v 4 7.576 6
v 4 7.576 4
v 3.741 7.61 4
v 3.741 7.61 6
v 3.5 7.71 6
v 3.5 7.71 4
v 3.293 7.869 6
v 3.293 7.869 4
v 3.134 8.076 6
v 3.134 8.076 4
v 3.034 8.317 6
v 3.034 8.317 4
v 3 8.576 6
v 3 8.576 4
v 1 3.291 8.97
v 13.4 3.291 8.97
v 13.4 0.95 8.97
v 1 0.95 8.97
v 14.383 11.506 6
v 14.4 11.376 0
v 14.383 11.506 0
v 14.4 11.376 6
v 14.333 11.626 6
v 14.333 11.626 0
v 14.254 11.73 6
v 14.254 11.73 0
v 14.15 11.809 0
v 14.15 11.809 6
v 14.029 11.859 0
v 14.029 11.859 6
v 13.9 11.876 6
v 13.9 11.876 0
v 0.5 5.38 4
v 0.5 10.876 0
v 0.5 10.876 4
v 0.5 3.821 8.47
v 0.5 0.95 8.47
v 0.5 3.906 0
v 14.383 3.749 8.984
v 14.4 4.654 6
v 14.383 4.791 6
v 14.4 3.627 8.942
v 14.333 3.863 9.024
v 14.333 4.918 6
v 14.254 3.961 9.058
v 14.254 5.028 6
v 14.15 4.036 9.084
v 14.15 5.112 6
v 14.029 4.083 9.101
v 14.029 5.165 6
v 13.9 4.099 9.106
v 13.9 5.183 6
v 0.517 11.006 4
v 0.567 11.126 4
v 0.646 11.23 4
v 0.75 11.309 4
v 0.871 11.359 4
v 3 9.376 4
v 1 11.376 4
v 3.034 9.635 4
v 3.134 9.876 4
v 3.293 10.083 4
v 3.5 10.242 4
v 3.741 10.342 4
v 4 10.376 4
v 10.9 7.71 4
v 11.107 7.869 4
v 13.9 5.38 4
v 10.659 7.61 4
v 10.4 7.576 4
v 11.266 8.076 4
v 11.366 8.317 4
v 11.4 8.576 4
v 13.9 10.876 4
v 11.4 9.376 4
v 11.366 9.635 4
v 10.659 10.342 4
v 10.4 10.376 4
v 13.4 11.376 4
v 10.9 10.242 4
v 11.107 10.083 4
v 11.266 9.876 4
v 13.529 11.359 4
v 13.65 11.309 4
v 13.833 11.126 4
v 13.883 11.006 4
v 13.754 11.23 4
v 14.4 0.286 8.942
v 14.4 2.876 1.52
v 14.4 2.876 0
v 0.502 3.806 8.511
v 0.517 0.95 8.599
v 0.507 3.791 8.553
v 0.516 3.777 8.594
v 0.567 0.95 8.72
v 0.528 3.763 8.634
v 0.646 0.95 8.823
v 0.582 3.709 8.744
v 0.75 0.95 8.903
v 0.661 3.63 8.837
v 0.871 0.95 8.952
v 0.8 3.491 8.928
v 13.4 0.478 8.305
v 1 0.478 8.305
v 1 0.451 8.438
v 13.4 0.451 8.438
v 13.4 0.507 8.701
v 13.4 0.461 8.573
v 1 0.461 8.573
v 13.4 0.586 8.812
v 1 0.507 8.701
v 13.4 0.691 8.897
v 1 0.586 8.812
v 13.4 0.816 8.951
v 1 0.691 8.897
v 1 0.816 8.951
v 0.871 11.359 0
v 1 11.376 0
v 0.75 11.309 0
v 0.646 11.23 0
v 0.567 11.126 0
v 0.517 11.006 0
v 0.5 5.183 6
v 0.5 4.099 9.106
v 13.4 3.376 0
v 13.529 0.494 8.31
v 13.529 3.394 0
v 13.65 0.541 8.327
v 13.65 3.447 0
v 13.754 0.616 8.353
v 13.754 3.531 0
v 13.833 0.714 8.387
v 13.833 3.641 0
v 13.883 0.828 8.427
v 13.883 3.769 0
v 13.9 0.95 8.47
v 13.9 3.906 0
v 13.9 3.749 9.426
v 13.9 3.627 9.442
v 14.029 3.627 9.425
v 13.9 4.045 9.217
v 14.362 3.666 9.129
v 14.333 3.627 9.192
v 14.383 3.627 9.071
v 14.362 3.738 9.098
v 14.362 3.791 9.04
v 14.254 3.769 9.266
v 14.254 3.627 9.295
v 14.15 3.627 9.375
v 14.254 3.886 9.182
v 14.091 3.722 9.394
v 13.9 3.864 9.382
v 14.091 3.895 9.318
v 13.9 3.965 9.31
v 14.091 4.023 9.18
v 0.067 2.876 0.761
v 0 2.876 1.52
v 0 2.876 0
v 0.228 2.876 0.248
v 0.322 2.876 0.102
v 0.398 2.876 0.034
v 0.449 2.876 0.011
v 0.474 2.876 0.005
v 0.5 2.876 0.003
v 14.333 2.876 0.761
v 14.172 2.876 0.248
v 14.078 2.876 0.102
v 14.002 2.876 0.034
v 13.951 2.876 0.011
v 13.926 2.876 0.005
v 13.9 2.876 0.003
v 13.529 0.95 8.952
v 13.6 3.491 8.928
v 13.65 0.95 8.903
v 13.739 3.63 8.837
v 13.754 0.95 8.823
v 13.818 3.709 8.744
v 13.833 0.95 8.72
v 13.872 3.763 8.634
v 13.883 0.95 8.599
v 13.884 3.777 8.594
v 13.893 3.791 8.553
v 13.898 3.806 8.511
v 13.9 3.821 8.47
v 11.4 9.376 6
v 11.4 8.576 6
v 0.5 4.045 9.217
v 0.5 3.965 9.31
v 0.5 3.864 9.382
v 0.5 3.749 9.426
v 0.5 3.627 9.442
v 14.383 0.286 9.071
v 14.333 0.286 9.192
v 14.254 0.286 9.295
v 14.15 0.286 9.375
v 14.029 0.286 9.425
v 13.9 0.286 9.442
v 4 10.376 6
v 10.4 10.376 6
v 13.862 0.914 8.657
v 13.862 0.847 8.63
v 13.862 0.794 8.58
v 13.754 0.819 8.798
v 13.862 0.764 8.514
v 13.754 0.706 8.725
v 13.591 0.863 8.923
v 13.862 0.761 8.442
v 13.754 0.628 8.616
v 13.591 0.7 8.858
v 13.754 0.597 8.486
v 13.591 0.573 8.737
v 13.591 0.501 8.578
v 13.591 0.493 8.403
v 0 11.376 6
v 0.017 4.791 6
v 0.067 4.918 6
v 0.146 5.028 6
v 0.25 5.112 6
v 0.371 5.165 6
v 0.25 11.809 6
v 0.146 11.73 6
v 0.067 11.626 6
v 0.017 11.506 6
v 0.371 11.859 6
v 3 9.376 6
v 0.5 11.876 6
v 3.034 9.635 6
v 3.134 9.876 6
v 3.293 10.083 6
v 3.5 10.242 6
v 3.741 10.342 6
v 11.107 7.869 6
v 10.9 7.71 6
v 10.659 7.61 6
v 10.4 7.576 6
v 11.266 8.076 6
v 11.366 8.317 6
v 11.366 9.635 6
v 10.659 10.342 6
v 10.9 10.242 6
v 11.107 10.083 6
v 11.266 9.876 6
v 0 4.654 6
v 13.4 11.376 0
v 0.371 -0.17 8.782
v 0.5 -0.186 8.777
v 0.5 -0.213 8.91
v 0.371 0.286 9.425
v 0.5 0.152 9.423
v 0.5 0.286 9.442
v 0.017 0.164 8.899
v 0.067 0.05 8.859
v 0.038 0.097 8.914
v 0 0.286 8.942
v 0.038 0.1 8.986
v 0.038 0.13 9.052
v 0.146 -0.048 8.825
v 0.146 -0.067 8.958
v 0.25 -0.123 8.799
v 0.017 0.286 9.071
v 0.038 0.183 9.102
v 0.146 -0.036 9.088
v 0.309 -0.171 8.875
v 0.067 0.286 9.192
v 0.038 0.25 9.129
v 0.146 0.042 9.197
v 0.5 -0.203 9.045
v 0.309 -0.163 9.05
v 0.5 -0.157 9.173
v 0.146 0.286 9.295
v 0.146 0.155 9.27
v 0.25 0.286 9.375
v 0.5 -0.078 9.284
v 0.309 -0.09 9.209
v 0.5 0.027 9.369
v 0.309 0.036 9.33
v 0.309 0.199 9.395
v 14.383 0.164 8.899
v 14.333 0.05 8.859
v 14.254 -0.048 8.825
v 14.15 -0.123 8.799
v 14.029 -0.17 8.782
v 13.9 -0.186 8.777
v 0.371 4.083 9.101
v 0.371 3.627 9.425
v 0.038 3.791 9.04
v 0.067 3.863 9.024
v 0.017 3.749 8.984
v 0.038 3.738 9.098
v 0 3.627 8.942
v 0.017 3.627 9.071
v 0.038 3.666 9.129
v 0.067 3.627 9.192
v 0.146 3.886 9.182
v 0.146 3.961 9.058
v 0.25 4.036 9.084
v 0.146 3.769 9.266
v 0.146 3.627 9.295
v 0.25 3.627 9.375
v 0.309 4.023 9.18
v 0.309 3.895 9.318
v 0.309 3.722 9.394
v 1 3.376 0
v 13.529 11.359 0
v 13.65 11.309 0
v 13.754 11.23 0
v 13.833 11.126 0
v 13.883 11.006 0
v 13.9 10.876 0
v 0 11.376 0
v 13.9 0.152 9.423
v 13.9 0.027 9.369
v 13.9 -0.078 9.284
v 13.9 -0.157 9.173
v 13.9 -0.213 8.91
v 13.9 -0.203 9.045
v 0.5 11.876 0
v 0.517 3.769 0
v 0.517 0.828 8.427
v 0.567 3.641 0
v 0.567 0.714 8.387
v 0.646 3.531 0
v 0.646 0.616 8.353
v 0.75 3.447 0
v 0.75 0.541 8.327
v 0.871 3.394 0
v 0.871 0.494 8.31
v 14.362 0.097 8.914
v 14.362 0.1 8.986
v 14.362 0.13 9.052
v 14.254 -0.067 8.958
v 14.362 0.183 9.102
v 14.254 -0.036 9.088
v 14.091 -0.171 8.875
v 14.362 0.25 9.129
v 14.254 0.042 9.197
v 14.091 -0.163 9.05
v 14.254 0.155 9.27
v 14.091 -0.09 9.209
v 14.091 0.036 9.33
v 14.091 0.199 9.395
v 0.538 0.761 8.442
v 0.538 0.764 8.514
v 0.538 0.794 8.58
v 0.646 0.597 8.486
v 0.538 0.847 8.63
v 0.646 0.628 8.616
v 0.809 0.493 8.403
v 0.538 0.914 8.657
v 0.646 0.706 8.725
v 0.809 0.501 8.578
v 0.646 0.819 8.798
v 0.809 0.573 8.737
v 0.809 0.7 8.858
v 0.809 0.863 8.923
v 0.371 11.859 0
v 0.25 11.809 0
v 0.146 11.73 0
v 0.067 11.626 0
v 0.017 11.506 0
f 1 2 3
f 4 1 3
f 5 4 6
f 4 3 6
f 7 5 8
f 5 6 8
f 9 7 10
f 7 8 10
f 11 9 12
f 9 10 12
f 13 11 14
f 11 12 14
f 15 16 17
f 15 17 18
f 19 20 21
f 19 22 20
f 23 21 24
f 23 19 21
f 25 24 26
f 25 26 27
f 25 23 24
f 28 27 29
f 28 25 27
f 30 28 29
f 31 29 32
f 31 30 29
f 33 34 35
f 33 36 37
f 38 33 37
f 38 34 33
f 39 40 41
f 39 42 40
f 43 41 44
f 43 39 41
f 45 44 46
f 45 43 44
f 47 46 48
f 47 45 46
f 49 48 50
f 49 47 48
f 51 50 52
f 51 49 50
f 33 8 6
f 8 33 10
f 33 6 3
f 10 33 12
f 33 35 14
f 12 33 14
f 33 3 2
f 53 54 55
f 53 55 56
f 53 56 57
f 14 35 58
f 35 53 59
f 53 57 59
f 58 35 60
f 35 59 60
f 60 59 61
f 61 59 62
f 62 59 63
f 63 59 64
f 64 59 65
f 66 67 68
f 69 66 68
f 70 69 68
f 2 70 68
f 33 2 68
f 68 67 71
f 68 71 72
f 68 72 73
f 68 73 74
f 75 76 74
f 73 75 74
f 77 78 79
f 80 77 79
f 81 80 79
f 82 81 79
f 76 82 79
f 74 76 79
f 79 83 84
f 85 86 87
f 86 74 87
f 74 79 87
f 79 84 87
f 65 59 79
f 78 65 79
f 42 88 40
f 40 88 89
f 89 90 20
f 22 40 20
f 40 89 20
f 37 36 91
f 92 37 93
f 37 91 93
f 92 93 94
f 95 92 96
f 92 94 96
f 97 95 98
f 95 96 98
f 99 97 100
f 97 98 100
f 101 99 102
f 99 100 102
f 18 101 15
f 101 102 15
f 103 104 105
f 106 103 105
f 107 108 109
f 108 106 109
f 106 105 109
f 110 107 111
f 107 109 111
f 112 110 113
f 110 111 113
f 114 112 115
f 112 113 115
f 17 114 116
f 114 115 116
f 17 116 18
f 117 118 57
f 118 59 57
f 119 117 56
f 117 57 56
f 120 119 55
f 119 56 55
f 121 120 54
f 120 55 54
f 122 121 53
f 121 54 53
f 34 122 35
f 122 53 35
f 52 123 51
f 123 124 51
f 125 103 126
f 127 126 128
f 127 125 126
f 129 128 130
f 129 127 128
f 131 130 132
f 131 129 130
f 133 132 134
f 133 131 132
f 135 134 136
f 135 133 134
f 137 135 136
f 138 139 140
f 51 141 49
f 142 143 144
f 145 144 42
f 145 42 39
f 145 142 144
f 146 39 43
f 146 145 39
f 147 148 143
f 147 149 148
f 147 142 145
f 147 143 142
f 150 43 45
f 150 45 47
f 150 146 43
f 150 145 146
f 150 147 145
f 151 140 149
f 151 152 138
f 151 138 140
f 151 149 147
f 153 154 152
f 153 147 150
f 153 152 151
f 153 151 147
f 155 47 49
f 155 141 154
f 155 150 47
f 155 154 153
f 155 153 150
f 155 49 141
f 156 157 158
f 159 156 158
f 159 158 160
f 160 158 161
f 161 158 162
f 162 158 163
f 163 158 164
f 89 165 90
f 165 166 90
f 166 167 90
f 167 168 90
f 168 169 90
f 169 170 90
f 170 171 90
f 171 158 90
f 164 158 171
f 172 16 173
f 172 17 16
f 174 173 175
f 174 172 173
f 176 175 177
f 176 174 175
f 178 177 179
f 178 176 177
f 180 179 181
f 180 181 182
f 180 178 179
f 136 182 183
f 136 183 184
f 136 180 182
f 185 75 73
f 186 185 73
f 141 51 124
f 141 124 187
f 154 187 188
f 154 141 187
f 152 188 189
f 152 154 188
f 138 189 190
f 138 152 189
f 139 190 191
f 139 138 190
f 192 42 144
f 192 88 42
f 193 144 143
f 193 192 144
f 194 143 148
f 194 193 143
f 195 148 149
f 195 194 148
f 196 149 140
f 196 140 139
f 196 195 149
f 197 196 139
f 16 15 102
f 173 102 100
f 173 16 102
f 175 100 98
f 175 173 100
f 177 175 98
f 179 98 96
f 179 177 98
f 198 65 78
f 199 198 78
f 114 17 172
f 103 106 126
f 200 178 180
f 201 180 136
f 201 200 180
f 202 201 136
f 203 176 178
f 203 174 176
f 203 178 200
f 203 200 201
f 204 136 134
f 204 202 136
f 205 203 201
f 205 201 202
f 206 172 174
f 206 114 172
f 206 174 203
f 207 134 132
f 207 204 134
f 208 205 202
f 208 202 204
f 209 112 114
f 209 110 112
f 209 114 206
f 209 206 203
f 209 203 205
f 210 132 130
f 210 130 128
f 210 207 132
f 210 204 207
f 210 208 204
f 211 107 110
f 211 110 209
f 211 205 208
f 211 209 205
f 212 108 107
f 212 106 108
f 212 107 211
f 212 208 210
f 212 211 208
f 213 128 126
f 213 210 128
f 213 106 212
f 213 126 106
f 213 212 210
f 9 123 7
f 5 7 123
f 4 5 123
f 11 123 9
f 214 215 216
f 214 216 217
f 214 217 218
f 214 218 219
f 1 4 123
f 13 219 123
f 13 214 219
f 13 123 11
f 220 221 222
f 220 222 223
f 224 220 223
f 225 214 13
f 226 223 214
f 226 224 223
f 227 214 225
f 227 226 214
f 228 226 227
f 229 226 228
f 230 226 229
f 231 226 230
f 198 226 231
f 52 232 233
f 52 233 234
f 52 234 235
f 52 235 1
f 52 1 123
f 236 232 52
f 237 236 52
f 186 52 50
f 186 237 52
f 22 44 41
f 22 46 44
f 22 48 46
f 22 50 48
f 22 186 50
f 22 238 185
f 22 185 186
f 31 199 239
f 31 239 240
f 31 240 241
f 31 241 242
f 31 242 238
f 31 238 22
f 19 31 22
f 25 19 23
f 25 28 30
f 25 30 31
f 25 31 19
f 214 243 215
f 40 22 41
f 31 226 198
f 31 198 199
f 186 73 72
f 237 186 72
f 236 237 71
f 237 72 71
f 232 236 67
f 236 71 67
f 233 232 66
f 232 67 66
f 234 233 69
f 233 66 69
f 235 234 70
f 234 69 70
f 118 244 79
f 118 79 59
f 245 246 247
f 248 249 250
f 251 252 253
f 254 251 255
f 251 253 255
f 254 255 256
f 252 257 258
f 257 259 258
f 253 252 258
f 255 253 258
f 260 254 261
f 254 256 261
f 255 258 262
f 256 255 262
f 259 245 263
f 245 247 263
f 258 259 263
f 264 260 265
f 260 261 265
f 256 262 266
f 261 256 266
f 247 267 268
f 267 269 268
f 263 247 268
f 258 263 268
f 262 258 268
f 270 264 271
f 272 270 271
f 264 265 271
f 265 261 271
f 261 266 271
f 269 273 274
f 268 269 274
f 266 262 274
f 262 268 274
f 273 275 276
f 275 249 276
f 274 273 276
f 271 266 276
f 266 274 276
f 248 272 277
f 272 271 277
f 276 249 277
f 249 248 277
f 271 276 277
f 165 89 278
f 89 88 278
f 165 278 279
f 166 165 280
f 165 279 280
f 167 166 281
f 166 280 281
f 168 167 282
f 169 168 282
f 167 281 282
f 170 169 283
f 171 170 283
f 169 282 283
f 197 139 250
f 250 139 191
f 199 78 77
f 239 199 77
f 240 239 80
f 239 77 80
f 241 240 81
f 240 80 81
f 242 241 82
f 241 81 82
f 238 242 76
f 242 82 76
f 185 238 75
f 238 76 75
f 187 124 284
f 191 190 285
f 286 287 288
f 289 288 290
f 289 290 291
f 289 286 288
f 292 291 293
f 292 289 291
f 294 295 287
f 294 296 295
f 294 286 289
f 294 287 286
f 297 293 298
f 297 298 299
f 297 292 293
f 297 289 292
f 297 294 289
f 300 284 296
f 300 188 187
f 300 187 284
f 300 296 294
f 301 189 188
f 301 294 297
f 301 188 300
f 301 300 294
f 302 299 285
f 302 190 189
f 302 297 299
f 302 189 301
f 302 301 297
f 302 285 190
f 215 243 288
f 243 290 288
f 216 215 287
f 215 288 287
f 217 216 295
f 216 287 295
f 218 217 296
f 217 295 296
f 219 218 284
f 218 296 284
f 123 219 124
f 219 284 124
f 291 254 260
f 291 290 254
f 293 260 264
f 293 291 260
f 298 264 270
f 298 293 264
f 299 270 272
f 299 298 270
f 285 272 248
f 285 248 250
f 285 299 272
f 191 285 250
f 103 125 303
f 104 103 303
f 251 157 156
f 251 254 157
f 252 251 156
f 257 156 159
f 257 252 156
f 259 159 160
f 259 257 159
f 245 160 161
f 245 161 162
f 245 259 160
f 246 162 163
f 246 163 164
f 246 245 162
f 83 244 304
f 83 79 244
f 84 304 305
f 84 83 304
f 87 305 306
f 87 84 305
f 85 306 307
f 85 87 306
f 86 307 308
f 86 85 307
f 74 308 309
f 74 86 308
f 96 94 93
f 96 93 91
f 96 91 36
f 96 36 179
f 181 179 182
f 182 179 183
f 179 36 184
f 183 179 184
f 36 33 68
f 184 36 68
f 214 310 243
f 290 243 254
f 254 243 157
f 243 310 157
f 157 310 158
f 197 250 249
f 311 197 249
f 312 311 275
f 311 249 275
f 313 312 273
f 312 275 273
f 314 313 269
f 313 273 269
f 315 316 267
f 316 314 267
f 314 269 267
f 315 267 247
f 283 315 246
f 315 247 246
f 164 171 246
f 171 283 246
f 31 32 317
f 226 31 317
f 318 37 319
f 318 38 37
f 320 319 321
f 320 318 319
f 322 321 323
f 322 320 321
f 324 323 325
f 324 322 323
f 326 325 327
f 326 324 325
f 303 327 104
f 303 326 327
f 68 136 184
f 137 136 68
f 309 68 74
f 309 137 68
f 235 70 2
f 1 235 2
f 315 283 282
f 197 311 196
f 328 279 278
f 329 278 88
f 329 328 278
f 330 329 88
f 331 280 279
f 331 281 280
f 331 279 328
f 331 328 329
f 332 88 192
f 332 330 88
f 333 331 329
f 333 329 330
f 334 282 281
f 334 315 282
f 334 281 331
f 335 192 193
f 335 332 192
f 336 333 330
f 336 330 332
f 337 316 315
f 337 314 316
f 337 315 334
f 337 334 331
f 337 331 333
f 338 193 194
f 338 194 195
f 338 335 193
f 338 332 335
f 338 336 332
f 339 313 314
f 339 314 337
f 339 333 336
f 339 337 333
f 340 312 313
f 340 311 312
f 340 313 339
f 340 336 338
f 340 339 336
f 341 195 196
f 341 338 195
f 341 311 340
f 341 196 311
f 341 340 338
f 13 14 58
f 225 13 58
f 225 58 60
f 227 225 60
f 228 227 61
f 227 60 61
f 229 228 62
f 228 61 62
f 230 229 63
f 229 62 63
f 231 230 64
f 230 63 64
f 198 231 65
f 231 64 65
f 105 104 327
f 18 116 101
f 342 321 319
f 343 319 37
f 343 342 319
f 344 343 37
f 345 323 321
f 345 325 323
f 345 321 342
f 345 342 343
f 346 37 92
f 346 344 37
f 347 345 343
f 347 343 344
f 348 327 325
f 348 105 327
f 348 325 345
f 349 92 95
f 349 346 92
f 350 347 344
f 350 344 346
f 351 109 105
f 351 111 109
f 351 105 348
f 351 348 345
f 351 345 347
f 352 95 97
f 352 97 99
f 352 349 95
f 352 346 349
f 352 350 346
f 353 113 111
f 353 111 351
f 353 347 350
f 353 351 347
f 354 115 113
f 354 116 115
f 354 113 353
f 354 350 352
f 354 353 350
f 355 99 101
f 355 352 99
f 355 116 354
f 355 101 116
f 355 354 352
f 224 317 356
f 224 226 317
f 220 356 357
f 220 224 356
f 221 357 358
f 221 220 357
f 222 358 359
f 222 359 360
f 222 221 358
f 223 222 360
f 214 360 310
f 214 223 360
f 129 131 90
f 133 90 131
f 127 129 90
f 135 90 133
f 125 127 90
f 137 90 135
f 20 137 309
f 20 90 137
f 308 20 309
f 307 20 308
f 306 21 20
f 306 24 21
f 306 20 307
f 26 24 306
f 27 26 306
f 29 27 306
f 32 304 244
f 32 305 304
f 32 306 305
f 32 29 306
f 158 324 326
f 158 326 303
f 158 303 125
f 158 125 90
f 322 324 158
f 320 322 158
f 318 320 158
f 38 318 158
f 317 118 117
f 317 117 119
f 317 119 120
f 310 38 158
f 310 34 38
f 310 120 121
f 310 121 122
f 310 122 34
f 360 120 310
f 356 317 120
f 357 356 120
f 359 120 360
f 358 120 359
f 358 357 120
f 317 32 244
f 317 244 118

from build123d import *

# Parameters (mm, degrees)
F1_DEPTH = 6
F2_W     = 14.4
F2_H     = 4.4
F5_W     = 13.4
F5_H     = 3.4
F9_DEPTH = 4
F10_R    = 0.5


with BuildPart() as f1:
    # F0 (on Top) → F1 (new body)
    with BuildSketch(Plane.XY):
        Polygon((0, 2.8761399509), (0.5, 2.8761399509), (13.9, 2.8761399509), (14.4, 2.8761399509), (14.4, 3.3761399509), (0, 3.3761399509), align=None)
        Polygon((0, 10.3761399509), (0, 3.3761399509), (14.4, 3.3761399509), (14.4, 10.3761399509), (14.4, 11.8761399509), (12.9, 11.8761399509), (1.5, 11.8761399509), (0, 11.8761399509), align=None)
        with BuildLine():
            ThreePointArc((3, 9.3761399509), (3.2928932188, 10.0832467321), (4, 10.3761399509))
            Line((4, 10.3761399509), (10.4, 10.3761399509))
            ThreePointArc((10.4, 10.3761399509), (11.1071067812, 10.0832467321), (11.4, 9.3761399509))
            Line((11.4, 9.3761399509), (11.4, 8.5761399509))
            ThreePointArc((11.4, 8.5761399509), (11.1071067812, 7.8690331698), (10.4, 7.5761399509))
            Line((10.4, 7.5761399509), (4, 7.5761399509))
            ThreePointArc((4, 7.5761399509), (3.2928932188, 7.8690331698), (3, 8.5761399509))
            Line((3, 8.5761399509), (3, 9.3761399509))
        make_face(mode=Mode.SUBTRACT)
    extrude(amount=F1_DEPTH)

    # F4: sweep along a path in F3
    with BuildLine(Plane(origin=(0, 0, 0), x_dir=(0, -1, 0), z_dir=(-1, 0, 0))) as f4_path:
        Line((-2.8761399509, 0), (0.418709749, 9.4416082028))
    # F2 (on face) → F4 (sweep)
    with BuildSketch(Plane(origin=(0, 0, 0), x_dir=(1, 0, 0), z_dir=(0, 0, -1))):
        with Locations((7.2, -5.0770884661)):
            Rectangle(F2_W, F2_H)
    sweep(path=f4_path.line)

    # F7: sweep along a path in F6
    with BuildLine(Plane.YZ) as f7_path:
        Line((3.6174104522, 8.9695277927), (6.7475176671, 0))
    # F5 (on face) → F7 (sweep, cut)
    with BuildSketch(Plane(origin=(0, 0, 0), x_dir=(1, 0, 0), z_dir=(0, 0, -1))):
        with Locations((7.2, -5.0761399509)):
            Rectangle(F5_W, F5_H)
    sweep(path=f7_path.line, mode=Mode.SUBTRACT)

    # F8 (on Top) → F9 (cut)
    with BuildSketch(Plane.XY):
        Polygon((13.9, 11.3761399509), (12.4, 11.3761399509), (2, 11.3761399509), (0.5, 11.3761399509), (0.5, 9.8761399509), (0.5, 4.8761399509), (0.5, 3.3786750864), (2, 3.3761399509), (12.4, 3.3761399509), (13.9, 3.3761399509), (13.9, 4.8761399509), (13.9, 9.8761399509), align=None)
    extrude(amount=F9_DEPTH, mode=Mode.SUBTRACT)

    # F10
    f10_edges = [f1.edges().sort_by_distance(p)[0] for p in [
        (0, 1.782239, 9.441608),
        (7.2, 3.982239, 9.441608),
        (14.4, 1.782239, 9.441608),
        (7.2, -0.417761, 9.441608),
        (14.4, 11.87614, 3),
        (0, 11.87614, 3),
        (0.5, 11.37614, 2),
        (13.9, 11.37614, 2),
        (0.5, 1.811086, 4.484764),
        (13.9, 1.811086, 4.484764),
        (0, 4.58275, 7.720804),
        (0, 1.229189, 4.722163),
        (14.4, 4.58275, 7.720804),
        (0.5, 1.946033, 8.969528),
        (7.2, 0.246033, 8.969528),
        (7.2, 3.646033, 8.969528),
        (13.9, 1.946033, 8.969528),
        (14.4, 1.229189, 4.722163),
    ]]
    fillet(f10_edges, radius=F10_R)


solid = f1.part
